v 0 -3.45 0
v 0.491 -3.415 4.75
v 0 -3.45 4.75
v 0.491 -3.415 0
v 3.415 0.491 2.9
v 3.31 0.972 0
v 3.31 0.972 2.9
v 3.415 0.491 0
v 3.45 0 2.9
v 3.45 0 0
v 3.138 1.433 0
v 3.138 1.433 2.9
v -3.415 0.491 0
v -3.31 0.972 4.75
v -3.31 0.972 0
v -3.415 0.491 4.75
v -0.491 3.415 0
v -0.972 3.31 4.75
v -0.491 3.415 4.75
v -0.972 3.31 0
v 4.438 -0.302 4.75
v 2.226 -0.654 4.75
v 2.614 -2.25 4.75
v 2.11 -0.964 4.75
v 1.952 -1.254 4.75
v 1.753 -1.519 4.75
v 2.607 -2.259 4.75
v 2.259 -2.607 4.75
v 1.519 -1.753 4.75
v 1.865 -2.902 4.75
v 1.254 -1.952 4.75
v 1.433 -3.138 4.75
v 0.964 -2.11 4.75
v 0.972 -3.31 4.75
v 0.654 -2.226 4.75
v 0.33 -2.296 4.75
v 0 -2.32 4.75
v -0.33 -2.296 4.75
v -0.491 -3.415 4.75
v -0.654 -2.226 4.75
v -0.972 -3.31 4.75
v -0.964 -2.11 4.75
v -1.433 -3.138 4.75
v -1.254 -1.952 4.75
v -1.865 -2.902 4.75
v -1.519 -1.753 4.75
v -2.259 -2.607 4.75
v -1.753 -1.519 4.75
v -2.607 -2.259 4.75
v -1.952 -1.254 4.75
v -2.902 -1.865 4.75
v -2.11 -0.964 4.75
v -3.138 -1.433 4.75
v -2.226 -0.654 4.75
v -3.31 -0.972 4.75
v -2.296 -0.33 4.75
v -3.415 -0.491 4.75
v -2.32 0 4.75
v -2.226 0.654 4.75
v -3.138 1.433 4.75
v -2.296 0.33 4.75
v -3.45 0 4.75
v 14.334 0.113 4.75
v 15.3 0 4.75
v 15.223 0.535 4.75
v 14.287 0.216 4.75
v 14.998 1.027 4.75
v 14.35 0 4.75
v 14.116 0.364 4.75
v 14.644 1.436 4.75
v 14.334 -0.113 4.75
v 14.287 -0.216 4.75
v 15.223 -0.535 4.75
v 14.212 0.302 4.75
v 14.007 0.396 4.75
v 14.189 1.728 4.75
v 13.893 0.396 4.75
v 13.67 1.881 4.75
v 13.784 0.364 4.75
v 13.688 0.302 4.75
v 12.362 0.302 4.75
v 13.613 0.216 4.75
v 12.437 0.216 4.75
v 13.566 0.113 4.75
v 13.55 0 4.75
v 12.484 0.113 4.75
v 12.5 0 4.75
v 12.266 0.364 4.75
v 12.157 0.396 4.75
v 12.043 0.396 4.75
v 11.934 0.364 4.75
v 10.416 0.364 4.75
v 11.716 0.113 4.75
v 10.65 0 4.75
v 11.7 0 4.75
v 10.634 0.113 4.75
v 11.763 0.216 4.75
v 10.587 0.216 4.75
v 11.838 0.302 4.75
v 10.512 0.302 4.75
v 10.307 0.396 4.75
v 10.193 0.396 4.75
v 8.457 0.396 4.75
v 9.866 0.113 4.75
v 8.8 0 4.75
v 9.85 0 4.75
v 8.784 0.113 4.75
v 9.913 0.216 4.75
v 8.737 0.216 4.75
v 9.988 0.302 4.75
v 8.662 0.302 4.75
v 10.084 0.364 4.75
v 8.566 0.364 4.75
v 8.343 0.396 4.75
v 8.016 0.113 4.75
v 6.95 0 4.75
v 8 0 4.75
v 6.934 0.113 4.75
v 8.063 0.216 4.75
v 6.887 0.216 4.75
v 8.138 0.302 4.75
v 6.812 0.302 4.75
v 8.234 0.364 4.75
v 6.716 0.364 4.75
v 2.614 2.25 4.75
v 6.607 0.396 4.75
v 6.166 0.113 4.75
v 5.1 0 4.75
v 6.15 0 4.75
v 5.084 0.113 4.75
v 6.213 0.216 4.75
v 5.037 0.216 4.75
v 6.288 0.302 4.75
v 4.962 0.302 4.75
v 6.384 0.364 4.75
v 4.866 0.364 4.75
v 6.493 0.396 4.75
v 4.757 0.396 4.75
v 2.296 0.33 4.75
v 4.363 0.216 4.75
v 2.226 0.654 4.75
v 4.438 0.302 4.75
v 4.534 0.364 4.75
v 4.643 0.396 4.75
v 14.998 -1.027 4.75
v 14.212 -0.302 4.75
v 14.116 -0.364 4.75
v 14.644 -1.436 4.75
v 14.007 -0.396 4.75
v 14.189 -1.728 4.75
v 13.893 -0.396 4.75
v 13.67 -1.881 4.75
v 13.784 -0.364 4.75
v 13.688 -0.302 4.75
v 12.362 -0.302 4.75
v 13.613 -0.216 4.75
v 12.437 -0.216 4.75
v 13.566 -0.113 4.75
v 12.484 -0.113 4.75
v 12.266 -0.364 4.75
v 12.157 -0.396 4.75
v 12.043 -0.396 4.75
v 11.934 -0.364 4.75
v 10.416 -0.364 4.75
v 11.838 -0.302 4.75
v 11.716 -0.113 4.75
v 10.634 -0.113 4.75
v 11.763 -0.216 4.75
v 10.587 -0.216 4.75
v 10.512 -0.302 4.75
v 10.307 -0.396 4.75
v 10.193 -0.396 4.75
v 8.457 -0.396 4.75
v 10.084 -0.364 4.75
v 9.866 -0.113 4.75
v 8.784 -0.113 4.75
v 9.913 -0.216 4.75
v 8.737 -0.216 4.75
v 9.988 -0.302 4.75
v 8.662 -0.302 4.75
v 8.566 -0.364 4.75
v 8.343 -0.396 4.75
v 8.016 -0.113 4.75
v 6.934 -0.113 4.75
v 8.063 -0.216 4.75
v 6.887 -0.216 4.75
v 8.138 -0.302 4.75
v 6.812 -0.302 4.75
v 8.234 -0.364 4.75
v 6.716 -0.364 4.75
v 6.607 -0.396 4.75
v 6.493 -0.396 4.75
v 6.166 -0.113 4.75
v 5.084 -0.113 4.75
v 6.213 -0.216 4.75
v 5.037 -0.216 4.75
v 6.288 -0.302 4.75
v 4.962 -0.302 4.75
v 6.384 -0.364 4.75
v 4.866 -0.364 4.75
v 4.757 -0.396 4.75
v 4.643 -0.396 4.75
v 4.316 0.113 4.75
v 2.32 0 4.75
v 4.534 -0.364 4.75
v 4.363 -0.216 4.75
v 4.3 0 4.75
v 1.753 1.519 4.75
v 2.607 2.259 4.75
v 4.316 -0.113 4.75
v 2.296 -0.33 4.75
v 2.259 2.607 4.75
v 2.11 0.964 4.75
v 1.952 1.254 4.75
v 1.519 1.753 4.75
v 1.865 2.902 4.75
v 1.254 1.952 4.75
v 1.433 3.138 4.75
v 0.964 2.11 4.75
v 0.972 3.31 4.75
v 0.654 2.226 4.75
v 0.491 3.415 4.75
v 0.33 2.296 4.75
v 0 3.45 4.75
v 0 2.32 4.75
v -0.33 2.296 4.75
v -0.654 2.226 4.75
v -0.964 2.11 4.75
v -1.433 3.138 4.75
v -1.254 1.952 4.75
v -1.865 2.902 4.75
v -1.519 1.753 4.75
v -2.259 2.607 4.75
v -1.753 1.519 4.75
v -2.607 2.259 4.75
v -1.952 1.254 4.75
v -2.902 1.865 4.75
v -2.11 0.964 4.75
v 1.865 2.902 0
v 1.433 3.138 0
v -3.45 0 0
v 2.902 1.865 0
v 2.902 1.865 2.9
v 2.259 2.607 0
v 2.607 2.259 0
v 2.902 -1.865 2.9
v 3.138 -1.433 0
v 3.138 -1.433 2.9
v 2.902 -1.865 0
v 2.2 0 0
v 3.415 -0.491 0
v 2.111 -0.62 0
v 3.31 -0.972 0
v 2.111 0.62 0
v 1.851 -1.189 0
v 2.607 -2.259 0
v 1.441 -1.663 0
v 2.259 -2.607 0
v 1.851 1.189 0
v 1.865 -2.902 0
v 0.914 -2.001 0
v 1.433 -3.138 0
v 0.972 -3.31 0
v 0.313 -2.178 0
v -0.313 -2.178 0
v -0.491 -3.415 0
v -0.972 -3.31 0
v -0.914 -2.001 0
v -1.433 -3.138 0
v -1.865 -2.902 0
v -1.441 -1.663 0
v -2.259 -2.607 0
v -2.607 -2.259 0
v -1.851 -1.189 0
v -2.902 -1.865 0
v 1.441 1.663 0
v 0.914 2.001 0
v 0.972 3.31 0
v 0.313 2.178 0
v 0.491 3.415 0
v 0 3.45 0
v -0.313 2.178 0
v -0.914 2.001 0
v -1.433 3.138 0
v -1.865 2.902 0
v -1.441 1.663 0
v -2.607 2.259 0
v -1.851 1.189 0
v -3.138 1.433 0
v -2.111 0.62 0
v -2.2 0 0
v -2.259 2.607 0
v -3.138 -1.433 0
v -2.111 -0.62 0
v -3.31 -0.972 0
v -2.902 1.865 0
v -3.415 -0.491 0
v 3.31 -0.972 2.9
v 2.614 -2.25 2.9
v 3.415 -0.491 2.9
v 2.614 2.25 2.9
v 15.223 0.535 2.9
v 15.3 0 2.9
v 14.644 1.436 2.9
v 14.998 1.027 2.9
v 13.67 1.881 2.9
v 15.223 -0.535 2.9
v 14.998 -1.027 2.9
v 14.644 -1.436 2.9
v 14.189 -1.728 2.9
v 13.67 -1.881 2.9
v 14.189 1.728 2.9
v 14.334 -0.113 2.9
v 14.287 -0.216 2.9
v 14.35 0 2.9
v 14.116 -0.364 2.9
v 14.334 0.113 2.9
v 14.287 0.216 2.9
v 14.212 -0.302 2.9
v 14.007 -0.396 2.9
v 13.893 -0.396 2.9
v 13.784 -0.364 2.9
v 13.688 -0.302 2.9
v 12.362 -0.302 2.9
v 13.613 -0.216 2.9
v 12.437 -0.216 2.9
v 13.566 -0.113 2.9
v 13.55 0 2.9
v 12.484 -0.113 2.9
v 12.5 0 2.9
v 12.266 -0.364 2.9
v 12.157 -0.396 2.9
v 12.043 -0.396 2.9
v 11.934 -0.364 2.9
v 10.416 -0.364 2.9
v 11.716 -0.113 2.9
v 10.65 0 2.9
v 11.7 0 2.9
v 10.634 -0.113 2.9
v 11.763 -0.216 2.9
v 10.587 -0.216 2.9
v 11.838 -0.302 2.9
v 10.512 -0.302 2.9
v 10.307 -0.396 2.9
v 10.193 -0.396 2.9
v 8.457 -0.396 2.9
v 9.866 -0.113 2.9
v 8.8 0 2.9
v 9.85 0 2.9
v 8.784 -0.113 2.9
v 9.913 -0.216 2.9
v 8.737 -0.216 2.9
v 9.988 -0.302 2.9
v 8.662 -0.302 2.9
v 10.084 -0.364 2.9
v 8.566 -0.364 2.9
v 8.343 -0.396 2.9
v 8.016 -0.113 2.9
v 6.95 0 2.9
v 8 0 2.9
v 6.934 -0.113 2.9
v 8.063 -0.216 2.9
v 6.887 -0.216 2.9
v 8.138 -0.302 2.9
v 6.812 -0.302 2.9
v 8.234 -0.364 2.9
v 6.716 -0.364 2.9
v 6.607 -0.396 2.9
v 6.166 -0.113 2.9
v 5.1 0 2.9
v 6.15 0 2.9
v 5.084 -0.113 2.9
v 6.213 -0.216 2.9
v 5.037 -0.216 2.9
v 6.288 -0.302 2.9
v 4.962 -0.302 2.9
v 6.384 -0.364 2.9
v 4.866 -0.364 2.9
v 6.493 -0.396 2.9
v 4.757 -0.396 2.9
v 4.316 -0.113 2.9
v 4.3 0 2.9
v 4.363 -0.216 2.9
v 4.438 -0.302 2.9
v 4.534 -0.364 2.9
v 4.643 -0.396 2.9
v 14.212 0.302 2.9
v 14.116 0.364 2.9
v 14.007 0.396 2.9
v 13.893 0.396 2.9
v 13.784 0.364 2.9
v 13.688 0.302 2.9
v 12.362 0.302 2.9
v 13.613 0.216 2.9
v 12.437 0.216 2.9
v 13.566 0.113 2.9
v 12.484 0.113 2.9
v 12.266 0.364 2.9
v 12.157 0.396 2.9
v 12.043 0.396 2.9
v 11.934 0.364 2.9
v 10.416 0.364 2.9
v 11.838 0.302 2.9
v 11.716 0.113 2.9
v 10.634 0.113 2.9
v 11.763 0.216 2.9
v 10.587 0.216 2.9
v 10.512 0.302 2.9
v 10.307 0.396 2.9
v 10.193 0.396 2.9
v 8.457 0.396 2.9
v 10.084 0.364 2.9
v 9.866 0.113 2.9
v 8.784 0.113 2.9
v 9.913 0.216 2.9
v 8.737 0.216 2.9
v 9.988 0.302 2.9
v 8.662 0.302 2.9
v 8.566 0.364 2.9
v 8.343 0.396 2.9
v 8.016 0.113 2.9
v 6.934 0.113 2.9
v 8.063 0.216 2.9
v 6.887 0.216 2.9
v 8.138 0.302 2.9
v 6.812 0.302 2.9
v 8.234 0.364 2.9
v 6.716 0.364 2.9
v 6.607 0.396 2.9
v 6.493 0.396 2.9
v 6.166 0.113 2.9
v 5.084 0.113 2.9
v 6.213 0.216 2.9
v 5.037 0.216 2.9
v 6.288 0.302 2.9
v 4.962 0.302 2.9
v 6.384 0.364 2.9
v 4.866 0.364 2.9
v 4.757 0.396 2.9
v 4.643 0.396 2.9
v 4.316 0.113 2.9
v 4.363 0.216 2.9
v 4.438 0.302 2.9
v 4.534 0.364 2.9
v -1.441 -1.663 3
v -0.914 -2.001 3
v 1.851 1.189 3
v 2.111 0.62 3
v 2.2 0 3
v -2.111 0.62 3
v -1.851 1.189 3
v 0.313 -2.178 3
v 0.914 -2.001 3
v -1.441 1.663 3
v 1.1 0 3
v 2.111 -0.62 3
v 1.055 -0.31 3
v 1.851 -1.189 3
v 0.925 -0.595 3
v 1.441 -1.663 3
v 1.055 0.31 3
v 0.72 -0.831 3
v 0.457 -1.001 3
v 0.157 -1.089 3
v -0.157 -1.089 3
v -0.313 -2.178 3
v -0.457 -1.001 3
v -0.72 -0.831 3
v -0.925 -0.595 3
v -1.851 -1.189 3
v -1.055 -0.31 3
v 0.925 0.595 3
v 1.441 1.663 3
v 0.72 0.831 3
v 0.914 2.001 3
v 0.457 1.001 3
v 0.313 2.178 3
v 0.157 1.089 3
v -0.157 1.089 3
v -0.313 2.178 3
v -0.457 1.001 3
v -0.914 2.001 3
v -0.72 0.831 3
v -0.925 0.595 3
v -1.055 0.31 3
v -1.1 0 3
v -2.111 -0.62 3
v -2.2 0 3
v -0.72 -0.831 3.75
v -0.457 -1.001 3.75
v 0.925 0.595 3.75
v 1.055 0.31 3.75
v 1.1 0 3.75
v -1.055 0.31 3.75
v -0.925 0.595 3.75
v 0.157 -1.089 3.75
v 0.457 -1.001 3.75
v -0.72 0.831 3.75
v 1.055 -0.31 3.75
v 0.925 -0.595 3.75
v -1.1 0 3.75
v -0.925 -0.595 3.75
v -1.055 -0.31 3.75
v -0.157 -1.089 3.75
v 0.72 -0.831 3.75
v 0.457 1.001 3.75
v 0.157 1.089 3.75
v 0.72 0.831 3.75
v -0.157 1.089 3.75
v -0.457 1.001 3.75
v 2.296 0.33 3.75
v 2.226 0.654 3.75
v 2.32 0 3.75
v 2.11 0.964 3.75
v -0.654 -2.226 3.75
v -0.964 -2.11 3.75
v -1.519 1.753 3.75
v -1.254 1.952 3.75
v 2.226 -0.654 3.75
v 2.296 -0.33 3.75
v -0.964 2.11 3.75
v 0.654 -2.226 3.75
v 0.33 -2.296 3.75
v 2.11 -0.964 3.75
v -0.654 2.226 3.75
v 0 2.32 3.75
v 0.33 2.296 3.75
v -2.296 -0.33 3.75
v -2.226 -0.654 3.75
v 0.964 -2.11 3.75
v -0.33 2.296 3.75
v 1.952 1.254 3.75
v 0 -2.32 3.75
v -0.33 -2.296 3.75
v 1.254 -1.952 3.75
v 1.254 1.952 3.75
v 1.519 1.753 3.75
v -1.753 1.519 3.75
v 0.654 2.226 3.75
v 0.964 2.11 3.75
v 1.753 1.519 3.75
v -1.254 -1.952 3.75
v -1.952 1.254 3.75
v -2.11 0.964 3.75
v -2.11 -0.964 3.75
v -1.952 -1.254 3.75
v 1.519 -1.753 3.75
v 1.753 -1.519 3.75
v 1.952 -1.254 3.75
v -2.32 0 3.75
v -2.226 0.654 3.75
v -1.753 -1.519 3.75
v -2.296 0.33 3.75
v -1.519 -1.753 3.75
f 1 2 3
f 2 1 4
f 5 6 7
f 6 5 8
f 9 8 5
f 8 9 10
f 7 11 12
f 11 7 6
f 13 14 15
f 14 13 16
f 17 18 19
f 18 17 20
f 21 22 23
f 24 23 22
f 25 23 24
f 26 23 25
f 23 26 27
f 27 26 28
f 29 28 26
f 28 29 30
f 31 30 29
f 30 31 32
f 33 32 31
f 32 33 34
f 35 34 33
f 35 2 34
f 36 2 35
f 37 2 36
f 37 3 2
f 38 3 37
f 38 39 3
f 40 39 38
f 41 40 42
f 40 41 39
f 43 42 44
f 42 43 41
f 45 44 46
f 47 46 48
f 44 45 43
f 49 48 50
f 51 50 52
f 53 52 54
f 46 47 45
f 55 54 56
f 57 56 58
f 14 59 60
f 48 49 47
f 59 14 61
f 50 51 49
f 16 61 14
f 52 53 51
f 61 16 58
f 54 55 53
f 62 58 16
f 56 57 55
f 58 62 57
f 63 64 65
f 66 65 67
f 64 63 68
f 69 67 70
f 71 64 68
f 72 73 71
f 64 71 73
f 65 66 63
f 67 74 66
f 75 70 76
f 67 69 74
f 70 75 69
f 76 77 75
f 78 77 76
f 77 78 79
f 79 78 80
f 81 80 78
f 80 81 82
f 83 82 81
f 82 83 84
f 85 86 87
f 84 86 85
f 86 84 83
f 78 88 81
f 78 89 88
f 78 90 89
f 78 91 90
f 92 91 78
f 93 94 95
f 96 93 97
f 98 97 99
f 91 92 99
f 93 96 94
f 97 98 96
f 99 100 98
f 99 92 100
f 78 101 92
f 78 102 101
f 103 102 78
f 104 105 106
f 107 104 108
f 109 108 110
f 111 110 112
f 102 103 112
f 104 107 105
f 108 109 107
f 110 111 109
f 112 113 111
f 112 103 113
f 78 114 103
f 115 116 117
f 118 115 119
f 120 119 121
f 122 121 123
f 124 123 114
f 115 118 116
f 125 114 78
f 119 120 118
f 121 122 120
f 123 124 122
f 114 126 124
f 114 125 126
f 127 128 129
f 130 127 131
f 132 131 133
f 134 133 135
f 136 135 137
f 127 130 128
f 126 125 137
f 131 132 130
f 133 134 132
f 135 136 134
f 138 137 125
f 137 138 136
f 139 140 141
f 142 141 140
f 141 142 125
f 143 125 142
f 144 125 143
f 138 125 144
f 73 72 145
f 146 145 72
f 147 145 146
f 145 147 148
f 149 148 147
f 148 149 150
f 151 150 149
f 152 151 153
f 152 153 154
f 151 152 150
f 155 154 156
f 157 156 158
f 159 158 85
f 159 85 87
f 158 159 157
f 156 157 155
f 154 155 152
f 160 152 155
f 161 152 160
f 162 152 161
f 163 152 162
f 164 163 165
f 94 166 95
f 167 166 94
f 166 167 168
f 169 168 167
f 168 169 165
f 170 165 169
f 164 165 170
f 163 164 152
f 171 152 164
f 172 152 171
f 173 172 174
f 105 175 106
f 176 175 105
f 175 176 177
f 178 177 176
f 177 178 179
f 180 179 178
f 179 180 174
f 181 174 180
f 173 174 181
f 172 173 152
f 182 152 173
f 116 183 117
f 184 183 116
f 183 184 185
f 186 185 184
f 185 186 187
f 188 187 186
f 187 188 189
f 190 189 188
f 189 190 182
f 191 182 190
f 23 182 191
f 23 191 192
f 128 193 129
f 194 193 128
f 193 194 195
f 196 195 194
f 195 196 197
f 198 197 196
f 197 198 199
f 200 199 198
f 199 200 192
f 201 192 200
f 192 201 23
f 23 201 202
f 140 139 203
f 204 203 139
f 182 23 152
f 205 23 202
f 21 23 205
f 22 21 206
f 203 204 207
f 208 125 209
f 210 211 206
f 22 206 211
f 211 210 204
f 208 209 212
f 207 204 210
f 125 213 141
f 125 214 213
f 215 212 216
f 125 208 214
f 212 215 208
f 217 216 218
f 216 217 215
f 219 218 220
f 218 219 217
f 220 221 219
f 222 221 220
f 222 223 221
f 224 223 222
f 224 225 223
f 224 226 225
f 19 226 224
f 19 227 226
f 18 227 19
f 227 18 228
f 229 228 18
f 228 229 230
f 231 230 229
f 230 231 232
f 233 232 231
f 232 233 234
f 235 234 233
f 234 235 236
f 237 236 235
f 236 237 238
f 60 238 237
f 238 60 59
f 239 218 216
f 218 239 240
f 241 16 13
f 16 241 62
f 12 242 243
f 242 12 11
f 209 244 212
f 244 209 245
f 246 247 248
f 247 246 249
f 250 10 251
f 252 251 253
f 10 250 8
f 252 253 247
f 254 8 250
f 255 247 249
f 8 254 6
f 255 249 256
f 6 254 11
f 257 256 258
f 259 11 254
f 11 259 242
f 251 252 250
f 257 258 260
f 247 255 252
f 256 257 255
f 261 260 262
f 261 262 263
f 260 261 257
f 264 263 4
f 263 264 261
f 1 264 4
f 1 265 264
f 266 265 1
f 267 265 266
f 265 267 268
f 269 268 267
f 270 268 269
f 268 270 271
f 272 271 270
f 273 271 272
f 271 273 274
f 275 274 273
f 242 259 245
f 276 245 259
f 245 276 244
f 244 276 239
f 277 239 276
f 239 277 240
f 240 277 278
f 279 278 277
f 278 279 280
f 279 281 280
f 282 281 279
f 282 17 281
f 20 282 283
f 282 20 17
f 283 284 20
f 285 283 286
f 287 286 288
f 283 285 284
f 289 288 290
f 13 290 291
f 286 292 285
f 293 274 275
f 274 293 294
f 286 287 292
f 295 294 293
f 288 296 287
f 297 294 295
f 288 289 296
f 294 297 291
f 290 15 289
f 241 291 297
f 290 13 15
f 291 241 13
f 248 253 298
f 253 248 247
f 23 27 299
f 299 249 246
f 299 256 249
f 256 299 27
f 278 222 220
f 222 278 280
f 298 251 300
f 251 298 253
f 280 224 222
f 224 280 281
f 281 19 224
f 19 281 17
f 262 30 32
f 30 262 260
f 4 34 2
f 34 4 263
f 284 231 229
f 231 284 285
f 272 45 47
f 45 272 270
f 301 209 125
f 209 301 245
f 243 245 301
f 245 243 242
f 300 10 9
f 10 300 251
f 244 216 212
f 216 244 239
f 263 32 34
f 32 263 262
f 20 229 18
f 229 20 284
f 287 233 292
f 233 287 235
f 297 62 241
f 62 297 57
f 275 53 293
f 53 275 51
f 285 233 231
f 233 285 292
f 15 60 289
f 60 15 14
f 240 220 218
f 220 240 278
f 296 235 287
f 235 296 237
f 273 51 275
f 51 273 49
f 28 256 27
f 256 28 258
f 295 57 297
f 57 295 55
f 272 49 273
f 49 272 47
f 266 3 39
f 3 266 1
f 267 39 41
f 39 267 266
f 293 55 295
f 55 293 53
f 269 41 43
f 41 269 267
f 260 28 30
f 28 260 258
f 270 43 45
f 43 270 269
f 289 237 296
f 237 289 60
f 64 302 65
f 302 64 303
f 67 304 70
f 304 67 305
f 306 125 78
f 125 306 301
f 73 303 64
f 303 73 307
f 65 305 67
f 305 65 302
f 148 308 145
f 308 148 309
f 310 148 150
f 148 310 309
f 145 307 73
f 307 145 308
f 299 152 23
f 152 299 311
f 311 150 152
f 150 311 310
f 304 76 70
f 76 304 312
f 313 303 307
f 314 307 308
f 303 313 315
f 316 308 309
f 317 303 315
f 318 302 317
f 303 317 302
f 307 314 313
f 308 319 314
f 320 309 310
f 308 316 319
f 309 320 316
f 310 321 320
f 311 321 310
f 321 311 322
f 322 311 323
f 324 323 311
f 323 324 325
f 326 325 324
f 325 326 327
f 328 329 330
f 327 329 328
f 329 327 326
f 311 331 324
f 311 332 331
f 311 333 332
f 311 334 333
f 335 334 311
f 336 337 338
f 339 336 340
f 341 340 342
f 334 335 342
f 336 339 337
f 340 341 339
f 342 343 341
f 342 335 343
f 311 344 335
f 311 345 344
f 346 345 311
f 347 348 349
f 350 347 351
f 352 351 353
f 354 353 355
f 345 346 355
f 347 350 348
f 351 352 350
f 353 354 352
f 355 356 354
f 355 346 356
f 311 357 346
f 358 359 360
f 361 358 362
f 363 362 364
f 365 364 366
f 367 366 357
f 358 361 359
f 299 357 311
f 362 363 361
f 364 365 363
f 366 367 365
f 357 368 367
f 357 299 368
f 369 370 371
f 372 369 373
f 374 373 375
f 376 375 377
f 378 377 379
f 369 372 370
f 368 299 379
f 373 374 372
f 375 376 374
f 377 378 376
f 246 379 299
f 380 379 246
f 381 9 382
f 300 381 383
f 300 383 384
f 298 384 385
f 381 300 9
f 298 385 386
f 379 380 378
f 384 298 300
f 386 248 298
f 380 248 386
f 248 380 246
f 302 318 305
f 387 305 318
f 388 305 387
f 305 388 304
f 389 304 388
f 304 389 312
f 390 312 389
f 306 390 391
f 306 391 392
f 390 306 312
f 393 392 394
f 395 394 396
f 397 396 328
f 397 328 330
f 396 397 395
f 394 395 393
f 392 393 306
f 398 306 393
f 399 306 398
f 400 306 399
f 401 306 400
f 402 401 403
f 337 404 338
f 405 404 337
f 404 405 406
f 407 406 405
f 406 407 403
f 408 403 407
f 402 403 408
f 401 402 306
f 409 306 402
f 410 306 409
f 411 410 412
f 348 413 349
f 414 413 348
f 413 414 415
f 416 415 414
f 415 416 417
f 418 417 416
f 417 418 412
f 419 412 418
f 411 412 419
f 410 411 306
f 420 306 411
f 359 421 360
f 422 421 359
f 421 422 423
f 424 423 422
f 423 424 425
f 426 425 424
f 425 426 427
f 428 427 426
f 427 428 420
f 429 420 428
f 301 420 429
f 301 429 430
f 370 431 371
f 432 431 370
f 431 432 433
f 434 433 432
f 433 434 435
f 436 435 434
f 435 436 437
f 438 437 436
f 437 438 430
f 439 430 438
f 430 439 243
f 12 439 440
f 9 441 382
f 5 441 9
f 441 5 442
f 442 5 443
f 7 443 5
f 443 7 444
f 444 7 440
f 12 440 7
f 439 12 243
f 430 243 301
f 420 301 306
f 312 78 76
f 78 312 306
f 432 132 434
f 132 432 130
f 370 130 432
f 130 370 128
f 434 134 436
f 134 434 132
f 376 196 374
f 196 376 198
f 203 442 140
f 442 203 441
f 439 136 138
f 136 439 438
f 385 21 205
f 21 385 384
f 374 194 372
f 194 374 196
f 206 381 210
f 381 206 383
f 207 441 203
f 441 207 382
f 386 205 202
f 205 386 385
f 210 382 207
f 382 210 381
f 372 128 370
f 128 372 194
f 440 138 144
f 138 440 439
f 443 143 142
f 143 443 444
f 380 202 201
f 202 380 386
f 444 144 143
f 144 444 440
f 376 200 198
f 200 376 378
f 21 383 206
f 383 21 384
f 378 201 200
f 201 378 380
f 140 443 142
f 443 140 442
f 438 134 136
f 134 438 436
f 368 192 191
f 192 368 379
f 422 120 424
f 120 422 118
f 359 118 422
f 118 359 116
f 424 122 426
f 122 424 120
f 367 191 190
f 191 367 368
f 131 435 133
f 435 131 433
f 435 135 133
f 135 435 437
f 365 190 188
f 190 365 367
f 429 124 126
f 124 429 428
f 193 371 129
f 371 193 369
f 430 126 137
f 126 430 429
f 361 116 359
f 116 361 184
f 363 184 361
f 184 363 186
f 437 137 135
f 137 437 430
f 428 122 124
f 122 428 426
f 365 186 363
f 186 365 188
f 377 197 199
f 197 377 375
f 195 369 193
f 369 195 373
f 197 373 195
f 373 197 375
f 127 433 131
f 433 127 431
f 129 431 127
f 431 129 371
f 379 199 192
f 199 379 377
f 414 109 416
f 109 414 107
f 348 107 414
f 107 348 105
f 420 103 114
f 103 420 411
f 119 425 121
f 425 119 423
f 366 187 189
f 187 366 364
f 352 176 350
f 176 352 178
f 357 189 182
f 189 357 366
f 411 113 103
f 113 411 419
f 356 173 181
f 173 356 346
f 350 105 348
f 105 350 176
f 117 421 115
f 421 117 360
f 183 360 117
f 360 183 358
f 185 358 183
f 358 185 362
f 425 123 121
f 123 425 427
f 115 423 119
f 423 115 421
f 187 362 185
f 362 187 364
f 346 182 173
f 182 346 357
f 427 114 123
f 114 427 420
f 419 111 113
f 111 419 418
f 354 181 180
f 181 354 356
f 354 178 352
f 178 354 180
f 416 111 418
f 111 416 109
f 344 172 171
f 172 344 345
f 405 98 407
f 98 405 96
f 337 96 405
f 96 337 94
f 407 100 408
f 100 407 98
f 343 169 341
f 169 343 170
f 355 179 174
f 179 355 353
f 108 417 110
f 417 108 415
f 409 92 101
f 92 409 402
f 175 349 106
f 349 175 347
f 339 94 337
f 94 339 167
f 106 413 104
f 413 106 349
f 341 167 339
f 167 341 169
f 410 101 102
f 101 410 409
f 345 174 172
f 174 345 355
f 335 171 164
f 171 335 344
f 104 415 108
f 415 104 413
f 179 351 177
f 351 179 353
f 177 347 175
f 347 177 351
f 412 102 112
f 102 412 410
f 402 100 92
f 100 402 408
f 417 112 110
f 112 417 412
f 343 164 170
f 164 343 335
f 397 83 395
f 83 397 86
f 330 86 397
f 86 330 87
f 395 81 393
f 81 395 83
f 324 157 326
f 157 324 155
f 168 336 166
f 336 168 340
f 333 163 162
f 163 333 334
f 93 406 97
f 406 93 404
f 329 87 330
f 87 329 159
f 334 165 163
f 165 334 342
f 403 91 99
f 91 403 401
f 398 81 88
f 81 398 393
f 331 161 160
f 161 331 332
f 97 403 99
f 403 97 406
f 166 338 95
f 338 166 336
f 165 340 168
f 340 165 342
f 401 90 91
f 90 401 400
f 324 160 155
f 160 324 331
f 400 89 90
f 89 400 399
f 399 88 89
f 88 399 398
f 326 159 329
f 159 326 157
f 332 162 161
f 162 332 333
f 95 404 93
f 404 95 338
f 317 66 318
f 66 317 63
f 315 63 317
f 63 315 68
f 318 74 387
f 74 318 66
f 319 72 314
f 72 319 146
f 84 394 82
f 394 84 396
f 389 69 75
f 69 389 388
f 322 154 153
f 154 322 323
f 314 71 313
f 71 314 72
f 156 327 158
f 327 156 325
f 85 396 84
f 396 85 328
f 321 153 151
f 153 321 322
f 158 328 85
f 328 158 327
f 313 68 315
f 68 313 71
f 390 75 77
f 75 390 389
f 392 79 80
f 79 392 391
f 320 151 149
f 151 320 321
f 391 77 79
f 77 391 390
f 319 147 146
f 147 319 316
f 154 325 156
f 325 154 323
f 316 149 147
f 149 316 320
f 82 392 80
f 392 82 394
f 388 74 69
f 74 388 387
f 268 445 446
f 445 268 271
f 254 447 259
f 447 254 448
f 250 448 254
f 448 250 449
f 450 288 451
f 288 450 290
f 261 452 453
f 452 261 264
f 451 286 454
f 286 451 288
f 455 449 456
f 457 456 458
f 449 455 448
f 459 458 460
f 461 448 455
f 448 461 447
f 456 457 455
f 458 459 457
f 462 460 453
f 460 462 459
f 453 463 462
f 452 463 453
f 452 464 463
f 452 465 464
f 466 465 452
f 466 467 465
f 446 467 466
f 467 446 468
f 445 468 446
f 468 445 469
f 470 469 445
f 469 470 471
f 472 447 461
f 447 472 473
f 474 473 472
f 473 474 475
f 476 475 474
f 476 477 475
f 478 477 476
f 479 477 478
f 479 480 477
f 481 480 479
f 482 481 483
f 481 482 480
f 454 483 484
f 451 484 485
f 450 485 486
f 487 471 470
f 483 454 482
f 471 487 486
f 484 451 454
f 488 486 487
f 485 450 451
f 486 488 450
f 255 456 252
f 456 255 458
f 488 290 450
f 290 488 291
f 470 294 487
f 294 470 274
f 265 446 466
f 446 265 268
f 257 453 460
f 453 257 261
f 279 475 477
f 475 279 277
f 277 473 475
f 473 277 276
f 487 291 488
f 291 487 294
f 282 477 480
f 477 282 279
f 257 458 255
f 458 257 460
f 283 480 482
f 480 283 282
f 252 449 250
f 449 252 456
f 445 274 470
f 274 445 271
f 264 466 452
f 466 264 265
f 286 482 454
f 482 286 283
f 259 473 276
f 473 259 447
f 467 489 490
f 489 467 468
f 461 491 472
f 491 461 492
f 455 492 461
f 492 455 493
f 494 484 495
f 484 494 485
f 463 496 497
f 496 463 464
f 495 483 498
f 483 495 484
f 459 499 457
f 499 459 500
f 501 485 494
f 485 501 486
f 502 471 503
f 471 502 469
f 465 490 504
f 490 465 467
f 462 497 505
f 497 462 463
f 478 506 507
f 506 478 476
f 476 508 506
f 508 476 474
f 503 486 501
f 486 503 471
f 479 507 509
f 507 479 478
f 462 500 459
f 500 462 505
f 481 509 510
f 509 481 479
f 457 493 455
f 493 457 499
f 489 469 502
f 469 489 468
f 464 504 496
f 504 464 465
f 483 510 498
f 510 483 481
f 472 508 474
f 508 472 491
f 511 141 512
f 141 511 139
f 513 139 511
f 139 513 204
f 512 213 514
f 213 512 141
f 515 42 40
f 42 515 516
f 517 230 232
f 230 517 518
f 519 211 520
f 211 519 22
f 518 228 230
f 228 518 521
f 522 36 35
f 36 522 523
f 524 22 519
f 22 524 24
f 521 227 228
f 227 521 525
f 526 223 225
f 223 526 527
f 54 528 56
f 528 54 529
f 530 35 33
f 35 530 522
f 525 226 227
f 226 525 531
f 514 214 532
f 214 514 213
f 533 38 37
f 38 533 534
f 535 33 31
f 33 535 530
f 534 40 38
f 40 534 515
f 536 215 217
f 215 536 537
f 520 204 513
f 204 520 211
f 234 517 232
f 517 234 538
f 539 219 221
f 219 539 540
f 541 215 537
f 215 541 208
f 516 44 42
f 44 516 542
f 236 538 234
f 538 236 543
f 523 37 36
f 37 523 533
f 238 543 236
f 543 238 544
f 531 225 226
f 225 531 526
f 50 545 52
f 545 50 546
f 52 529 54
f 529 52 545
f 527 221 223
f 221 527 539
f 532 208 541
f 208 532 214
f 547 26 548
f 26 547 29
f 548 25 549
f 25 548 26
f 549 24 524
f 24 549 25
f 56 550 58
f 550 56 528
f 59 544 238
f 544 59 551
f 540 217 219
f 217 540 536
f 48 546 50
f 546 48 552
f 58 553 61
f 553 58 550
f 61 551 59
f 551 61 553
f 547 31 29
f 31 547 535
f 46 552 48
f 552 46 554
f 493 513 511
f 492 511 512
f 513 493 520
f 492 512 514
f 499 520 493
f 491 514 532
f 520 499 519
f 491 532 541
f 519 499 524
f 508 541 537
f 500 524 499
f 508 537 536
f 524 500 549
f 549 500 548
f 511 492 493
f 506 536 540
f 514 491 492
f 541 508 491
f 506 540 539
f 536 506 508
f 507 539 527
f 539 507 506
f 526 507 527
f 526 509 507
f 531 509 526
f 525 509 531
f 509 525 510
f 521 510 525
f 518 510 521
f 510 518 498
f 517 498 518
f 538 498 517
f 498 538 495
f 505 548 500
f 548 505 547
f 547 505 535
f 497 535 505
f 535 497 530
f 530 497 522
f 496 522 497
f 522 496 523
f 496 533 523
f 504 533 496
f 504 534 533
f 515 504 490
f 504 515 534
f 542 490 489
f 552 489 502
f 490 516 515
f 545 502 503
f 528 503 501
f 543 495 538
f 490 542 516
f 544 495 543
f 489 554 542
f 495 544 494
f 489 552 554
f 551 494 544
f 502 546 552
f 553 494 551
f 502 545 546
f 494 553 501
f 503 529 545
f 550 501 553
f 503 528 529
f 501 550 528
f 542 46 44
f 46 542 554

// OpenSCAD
// armSingle for sg92r micro servo

//------------------------------------------
// armSingle
module armSingle(){
difference(){
    union(){
        // Boss
        cylinder(r=6.9/2,h=4.75,$fn=44);
        // arm
        hull(){
            translate([0,0,4.75-1.85])
            cylinder(r=2.35,h=1.85,$fn=22);

            translate([13.4,0,4.75-1.85])
            cylinder(r=3.8/2,h=1.85,$fn=22);
        }
    }

    // bottom cut
    cylinder(r=2.2,h=3.0,$fn=22);
    // thru cut
    cylinder(r=1.1,h=5,$fn=22);
    // top cut
    translate([0,0,4.75-1.0])
    cylinder(r=2.32,h=1,$fn=44);
    
    // holes in the arm
    for(i=[0:5])
    translate([4.7+i*1.85,0,4.75-1.85])
    cylinder(r=0.4,h=2,$fn=22);
}
} // ---------- end module armSingle -------

armSingle();
